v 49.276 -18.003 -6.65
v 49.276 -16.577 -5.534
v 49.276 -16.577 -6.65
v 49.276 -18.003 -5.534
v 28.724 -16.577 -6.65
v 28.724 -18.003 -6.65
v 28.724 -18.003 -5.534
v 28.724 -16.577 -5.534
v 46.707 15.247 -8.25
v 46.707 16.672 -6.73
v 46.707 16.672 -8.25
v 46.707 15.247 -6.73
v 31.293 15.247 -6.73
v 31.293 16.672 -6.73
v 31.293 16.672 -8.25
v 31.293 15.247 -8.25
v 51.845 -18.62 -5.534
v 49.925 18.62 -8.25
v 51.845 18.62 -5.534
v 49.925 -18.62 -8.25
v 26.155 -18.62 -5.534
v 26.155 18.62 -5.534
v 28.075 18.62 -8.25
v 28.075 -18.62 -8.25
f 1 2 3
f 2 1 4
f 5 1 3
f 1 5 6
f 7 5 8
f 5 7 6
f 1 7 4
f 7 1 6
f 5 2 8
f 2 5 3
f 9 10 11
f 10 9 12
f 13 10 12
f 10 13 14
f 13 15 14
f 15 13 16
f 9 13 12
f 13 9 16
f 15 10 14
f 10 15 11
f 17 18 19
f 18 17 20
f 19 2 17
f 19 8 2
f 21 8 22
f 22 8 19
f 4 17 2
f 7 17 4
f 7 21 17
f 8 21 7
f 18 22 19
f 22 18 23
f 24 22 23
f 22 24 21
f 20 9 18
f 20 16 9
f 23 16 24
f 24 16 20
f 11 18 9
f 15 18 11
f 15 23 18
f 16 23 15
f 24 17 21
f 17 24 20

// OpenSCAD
include <MCAD/boxes.scad>

//Pill box with sliding lid

/* [Outside Box Dimensions] */
//Box Width (min: 5 x Wall Thickness)
bX=24; //night
bX=29; //morning
//Box Depth (min: 5 x Wall Thickness)
bY=42; 
//Box Height (min: 5 x Wall Thickness)
bZ=12; //night
bZ=16.5; //morning
//Corner Radius (radius of the corner fillet inside and outside)
corner=2.5; 
//X Dividers (0 for no dividers)
col=0; 
//Y Dividers (0 for no dividers)
row=0; 
//Divider Wall Thickness
divWall=1.5;

/* [Wall Thickness] */
//Wall Thickness (min: 2mm)
wall=2.8;

/* [Lid] */
//Lid Lip Width (min: 1mm)
lip=2;
//Snugness of Lid (values approaching 1.0 result in a snugger fit)
snug=.97; 

/* [Catch] */
//Catch Height (height over the lip for the catch)
catch=1;

/* [Hidden] */
boxDim=[bX, bY, bZ]; 
over=.5; //amount to extend parts that need to have interference (such as dividers)
module xDiv(inSide){
  xInc=inSide[0]/col;
  for ( i = [1 : col-1] ) {
    translate([i*xInc, 0, 0])cube([divWall, inSide[1]+over, inSide[2]+over], center=true);
  }
}


module yDiv(inSide){
  yInc=inSide[1]/row;
  for (i = [1 : row-1] ) {
    translate([0, i*yInc, 0])cube([inSide[0]+over, divWall, inSide[2]+over], center=true);
  }
}

module drawBox () {
  innerBox=[bX-(2*wall), bY-(2*wall), bZ-(2*wall)+.22];
  echo("innerBox=", innerBox);
  union() {
    difference() {
      roundedBox(boxDim, corner, sidesonly=1, $fn=36);
      roundedBox(innerBox, corner, sidesonly=1, $fn=20);
      translate([0, -wall, bZ/2+.1]) cutLid(0);
    }
    translate([-innerBox[0]/2, 0, -over/2]) xDiv(innerBox);
    translate([0, -innerBox[1]/2, -over/2]) yDiv(innerBox);
  }
}

module cutLid(shorten, catch) {
  //Create a trapezoid lid 

  insideLip=wall*1.2; //lip inside the box for the lid to rest upon
  lX=bX-(2*wall)+insideLip;
  lY=bY-shorten;

  echo("inside lip=", insideLip/2);

  //polygon points
  p0=[0, 0];
  p1=[lX, 0];
  p2=[lX-lip, wall];
  p3=[lip, wall];

  // this needs to be less than 45 deg to be usable
  echo("Lip Overhang (degrees)=", atan(lip/wall));
  
  difference() {
    rotate([90,0,0])
      translate([-lX/2, -wall, 0]) 
      linear_extrude(height=lY, center=true) polygon([p0, p1, p2, p3], paths=[[0,1,2,3]]);
    if (catch==1) {
      translate([0, lY/2-wall/2, -wall+catch/2]) cube([lX*.8, catch*1.5, catch*1.3], center=true);
      //Add an additional slot to make it easier to slide open the lid
      translate([0, -lY/2+wall, wall/3]) cube([lX*.6, catch*1.5, catch*5], center=true);
    } else {
      echo("catch=false");
    }

  }
}

module drawCatch() {
  rad=catch/2;
  lX=bX-2*(wall+.2);

  union() {
    translate([-lX/3, 0, 0]) sphere(r=rad, $fn=20);
    translate([ lX/3, 0, 0]) sphere(r=rad, $fn=20);
    rotate([0,90,0])cylinder(h=lX/1.5, r=rad, center=true, $fn=20);
  }
}

module assemble() {
      //move the catch to the front of the box
      //drawBox(); translate([0, -(bY/2)+wall/2, bZ/2-wall]) drawCatch();
  //draw the lid (wall, 1) - second paramater specifies to add a hole for a catch
  translate([bX+10, 0, (-bZ/2)]) rotate([180, 0, 0]) scale([snug-.01, snug-.02, snug]) cutLid(wall, 1);
}
assemble();
